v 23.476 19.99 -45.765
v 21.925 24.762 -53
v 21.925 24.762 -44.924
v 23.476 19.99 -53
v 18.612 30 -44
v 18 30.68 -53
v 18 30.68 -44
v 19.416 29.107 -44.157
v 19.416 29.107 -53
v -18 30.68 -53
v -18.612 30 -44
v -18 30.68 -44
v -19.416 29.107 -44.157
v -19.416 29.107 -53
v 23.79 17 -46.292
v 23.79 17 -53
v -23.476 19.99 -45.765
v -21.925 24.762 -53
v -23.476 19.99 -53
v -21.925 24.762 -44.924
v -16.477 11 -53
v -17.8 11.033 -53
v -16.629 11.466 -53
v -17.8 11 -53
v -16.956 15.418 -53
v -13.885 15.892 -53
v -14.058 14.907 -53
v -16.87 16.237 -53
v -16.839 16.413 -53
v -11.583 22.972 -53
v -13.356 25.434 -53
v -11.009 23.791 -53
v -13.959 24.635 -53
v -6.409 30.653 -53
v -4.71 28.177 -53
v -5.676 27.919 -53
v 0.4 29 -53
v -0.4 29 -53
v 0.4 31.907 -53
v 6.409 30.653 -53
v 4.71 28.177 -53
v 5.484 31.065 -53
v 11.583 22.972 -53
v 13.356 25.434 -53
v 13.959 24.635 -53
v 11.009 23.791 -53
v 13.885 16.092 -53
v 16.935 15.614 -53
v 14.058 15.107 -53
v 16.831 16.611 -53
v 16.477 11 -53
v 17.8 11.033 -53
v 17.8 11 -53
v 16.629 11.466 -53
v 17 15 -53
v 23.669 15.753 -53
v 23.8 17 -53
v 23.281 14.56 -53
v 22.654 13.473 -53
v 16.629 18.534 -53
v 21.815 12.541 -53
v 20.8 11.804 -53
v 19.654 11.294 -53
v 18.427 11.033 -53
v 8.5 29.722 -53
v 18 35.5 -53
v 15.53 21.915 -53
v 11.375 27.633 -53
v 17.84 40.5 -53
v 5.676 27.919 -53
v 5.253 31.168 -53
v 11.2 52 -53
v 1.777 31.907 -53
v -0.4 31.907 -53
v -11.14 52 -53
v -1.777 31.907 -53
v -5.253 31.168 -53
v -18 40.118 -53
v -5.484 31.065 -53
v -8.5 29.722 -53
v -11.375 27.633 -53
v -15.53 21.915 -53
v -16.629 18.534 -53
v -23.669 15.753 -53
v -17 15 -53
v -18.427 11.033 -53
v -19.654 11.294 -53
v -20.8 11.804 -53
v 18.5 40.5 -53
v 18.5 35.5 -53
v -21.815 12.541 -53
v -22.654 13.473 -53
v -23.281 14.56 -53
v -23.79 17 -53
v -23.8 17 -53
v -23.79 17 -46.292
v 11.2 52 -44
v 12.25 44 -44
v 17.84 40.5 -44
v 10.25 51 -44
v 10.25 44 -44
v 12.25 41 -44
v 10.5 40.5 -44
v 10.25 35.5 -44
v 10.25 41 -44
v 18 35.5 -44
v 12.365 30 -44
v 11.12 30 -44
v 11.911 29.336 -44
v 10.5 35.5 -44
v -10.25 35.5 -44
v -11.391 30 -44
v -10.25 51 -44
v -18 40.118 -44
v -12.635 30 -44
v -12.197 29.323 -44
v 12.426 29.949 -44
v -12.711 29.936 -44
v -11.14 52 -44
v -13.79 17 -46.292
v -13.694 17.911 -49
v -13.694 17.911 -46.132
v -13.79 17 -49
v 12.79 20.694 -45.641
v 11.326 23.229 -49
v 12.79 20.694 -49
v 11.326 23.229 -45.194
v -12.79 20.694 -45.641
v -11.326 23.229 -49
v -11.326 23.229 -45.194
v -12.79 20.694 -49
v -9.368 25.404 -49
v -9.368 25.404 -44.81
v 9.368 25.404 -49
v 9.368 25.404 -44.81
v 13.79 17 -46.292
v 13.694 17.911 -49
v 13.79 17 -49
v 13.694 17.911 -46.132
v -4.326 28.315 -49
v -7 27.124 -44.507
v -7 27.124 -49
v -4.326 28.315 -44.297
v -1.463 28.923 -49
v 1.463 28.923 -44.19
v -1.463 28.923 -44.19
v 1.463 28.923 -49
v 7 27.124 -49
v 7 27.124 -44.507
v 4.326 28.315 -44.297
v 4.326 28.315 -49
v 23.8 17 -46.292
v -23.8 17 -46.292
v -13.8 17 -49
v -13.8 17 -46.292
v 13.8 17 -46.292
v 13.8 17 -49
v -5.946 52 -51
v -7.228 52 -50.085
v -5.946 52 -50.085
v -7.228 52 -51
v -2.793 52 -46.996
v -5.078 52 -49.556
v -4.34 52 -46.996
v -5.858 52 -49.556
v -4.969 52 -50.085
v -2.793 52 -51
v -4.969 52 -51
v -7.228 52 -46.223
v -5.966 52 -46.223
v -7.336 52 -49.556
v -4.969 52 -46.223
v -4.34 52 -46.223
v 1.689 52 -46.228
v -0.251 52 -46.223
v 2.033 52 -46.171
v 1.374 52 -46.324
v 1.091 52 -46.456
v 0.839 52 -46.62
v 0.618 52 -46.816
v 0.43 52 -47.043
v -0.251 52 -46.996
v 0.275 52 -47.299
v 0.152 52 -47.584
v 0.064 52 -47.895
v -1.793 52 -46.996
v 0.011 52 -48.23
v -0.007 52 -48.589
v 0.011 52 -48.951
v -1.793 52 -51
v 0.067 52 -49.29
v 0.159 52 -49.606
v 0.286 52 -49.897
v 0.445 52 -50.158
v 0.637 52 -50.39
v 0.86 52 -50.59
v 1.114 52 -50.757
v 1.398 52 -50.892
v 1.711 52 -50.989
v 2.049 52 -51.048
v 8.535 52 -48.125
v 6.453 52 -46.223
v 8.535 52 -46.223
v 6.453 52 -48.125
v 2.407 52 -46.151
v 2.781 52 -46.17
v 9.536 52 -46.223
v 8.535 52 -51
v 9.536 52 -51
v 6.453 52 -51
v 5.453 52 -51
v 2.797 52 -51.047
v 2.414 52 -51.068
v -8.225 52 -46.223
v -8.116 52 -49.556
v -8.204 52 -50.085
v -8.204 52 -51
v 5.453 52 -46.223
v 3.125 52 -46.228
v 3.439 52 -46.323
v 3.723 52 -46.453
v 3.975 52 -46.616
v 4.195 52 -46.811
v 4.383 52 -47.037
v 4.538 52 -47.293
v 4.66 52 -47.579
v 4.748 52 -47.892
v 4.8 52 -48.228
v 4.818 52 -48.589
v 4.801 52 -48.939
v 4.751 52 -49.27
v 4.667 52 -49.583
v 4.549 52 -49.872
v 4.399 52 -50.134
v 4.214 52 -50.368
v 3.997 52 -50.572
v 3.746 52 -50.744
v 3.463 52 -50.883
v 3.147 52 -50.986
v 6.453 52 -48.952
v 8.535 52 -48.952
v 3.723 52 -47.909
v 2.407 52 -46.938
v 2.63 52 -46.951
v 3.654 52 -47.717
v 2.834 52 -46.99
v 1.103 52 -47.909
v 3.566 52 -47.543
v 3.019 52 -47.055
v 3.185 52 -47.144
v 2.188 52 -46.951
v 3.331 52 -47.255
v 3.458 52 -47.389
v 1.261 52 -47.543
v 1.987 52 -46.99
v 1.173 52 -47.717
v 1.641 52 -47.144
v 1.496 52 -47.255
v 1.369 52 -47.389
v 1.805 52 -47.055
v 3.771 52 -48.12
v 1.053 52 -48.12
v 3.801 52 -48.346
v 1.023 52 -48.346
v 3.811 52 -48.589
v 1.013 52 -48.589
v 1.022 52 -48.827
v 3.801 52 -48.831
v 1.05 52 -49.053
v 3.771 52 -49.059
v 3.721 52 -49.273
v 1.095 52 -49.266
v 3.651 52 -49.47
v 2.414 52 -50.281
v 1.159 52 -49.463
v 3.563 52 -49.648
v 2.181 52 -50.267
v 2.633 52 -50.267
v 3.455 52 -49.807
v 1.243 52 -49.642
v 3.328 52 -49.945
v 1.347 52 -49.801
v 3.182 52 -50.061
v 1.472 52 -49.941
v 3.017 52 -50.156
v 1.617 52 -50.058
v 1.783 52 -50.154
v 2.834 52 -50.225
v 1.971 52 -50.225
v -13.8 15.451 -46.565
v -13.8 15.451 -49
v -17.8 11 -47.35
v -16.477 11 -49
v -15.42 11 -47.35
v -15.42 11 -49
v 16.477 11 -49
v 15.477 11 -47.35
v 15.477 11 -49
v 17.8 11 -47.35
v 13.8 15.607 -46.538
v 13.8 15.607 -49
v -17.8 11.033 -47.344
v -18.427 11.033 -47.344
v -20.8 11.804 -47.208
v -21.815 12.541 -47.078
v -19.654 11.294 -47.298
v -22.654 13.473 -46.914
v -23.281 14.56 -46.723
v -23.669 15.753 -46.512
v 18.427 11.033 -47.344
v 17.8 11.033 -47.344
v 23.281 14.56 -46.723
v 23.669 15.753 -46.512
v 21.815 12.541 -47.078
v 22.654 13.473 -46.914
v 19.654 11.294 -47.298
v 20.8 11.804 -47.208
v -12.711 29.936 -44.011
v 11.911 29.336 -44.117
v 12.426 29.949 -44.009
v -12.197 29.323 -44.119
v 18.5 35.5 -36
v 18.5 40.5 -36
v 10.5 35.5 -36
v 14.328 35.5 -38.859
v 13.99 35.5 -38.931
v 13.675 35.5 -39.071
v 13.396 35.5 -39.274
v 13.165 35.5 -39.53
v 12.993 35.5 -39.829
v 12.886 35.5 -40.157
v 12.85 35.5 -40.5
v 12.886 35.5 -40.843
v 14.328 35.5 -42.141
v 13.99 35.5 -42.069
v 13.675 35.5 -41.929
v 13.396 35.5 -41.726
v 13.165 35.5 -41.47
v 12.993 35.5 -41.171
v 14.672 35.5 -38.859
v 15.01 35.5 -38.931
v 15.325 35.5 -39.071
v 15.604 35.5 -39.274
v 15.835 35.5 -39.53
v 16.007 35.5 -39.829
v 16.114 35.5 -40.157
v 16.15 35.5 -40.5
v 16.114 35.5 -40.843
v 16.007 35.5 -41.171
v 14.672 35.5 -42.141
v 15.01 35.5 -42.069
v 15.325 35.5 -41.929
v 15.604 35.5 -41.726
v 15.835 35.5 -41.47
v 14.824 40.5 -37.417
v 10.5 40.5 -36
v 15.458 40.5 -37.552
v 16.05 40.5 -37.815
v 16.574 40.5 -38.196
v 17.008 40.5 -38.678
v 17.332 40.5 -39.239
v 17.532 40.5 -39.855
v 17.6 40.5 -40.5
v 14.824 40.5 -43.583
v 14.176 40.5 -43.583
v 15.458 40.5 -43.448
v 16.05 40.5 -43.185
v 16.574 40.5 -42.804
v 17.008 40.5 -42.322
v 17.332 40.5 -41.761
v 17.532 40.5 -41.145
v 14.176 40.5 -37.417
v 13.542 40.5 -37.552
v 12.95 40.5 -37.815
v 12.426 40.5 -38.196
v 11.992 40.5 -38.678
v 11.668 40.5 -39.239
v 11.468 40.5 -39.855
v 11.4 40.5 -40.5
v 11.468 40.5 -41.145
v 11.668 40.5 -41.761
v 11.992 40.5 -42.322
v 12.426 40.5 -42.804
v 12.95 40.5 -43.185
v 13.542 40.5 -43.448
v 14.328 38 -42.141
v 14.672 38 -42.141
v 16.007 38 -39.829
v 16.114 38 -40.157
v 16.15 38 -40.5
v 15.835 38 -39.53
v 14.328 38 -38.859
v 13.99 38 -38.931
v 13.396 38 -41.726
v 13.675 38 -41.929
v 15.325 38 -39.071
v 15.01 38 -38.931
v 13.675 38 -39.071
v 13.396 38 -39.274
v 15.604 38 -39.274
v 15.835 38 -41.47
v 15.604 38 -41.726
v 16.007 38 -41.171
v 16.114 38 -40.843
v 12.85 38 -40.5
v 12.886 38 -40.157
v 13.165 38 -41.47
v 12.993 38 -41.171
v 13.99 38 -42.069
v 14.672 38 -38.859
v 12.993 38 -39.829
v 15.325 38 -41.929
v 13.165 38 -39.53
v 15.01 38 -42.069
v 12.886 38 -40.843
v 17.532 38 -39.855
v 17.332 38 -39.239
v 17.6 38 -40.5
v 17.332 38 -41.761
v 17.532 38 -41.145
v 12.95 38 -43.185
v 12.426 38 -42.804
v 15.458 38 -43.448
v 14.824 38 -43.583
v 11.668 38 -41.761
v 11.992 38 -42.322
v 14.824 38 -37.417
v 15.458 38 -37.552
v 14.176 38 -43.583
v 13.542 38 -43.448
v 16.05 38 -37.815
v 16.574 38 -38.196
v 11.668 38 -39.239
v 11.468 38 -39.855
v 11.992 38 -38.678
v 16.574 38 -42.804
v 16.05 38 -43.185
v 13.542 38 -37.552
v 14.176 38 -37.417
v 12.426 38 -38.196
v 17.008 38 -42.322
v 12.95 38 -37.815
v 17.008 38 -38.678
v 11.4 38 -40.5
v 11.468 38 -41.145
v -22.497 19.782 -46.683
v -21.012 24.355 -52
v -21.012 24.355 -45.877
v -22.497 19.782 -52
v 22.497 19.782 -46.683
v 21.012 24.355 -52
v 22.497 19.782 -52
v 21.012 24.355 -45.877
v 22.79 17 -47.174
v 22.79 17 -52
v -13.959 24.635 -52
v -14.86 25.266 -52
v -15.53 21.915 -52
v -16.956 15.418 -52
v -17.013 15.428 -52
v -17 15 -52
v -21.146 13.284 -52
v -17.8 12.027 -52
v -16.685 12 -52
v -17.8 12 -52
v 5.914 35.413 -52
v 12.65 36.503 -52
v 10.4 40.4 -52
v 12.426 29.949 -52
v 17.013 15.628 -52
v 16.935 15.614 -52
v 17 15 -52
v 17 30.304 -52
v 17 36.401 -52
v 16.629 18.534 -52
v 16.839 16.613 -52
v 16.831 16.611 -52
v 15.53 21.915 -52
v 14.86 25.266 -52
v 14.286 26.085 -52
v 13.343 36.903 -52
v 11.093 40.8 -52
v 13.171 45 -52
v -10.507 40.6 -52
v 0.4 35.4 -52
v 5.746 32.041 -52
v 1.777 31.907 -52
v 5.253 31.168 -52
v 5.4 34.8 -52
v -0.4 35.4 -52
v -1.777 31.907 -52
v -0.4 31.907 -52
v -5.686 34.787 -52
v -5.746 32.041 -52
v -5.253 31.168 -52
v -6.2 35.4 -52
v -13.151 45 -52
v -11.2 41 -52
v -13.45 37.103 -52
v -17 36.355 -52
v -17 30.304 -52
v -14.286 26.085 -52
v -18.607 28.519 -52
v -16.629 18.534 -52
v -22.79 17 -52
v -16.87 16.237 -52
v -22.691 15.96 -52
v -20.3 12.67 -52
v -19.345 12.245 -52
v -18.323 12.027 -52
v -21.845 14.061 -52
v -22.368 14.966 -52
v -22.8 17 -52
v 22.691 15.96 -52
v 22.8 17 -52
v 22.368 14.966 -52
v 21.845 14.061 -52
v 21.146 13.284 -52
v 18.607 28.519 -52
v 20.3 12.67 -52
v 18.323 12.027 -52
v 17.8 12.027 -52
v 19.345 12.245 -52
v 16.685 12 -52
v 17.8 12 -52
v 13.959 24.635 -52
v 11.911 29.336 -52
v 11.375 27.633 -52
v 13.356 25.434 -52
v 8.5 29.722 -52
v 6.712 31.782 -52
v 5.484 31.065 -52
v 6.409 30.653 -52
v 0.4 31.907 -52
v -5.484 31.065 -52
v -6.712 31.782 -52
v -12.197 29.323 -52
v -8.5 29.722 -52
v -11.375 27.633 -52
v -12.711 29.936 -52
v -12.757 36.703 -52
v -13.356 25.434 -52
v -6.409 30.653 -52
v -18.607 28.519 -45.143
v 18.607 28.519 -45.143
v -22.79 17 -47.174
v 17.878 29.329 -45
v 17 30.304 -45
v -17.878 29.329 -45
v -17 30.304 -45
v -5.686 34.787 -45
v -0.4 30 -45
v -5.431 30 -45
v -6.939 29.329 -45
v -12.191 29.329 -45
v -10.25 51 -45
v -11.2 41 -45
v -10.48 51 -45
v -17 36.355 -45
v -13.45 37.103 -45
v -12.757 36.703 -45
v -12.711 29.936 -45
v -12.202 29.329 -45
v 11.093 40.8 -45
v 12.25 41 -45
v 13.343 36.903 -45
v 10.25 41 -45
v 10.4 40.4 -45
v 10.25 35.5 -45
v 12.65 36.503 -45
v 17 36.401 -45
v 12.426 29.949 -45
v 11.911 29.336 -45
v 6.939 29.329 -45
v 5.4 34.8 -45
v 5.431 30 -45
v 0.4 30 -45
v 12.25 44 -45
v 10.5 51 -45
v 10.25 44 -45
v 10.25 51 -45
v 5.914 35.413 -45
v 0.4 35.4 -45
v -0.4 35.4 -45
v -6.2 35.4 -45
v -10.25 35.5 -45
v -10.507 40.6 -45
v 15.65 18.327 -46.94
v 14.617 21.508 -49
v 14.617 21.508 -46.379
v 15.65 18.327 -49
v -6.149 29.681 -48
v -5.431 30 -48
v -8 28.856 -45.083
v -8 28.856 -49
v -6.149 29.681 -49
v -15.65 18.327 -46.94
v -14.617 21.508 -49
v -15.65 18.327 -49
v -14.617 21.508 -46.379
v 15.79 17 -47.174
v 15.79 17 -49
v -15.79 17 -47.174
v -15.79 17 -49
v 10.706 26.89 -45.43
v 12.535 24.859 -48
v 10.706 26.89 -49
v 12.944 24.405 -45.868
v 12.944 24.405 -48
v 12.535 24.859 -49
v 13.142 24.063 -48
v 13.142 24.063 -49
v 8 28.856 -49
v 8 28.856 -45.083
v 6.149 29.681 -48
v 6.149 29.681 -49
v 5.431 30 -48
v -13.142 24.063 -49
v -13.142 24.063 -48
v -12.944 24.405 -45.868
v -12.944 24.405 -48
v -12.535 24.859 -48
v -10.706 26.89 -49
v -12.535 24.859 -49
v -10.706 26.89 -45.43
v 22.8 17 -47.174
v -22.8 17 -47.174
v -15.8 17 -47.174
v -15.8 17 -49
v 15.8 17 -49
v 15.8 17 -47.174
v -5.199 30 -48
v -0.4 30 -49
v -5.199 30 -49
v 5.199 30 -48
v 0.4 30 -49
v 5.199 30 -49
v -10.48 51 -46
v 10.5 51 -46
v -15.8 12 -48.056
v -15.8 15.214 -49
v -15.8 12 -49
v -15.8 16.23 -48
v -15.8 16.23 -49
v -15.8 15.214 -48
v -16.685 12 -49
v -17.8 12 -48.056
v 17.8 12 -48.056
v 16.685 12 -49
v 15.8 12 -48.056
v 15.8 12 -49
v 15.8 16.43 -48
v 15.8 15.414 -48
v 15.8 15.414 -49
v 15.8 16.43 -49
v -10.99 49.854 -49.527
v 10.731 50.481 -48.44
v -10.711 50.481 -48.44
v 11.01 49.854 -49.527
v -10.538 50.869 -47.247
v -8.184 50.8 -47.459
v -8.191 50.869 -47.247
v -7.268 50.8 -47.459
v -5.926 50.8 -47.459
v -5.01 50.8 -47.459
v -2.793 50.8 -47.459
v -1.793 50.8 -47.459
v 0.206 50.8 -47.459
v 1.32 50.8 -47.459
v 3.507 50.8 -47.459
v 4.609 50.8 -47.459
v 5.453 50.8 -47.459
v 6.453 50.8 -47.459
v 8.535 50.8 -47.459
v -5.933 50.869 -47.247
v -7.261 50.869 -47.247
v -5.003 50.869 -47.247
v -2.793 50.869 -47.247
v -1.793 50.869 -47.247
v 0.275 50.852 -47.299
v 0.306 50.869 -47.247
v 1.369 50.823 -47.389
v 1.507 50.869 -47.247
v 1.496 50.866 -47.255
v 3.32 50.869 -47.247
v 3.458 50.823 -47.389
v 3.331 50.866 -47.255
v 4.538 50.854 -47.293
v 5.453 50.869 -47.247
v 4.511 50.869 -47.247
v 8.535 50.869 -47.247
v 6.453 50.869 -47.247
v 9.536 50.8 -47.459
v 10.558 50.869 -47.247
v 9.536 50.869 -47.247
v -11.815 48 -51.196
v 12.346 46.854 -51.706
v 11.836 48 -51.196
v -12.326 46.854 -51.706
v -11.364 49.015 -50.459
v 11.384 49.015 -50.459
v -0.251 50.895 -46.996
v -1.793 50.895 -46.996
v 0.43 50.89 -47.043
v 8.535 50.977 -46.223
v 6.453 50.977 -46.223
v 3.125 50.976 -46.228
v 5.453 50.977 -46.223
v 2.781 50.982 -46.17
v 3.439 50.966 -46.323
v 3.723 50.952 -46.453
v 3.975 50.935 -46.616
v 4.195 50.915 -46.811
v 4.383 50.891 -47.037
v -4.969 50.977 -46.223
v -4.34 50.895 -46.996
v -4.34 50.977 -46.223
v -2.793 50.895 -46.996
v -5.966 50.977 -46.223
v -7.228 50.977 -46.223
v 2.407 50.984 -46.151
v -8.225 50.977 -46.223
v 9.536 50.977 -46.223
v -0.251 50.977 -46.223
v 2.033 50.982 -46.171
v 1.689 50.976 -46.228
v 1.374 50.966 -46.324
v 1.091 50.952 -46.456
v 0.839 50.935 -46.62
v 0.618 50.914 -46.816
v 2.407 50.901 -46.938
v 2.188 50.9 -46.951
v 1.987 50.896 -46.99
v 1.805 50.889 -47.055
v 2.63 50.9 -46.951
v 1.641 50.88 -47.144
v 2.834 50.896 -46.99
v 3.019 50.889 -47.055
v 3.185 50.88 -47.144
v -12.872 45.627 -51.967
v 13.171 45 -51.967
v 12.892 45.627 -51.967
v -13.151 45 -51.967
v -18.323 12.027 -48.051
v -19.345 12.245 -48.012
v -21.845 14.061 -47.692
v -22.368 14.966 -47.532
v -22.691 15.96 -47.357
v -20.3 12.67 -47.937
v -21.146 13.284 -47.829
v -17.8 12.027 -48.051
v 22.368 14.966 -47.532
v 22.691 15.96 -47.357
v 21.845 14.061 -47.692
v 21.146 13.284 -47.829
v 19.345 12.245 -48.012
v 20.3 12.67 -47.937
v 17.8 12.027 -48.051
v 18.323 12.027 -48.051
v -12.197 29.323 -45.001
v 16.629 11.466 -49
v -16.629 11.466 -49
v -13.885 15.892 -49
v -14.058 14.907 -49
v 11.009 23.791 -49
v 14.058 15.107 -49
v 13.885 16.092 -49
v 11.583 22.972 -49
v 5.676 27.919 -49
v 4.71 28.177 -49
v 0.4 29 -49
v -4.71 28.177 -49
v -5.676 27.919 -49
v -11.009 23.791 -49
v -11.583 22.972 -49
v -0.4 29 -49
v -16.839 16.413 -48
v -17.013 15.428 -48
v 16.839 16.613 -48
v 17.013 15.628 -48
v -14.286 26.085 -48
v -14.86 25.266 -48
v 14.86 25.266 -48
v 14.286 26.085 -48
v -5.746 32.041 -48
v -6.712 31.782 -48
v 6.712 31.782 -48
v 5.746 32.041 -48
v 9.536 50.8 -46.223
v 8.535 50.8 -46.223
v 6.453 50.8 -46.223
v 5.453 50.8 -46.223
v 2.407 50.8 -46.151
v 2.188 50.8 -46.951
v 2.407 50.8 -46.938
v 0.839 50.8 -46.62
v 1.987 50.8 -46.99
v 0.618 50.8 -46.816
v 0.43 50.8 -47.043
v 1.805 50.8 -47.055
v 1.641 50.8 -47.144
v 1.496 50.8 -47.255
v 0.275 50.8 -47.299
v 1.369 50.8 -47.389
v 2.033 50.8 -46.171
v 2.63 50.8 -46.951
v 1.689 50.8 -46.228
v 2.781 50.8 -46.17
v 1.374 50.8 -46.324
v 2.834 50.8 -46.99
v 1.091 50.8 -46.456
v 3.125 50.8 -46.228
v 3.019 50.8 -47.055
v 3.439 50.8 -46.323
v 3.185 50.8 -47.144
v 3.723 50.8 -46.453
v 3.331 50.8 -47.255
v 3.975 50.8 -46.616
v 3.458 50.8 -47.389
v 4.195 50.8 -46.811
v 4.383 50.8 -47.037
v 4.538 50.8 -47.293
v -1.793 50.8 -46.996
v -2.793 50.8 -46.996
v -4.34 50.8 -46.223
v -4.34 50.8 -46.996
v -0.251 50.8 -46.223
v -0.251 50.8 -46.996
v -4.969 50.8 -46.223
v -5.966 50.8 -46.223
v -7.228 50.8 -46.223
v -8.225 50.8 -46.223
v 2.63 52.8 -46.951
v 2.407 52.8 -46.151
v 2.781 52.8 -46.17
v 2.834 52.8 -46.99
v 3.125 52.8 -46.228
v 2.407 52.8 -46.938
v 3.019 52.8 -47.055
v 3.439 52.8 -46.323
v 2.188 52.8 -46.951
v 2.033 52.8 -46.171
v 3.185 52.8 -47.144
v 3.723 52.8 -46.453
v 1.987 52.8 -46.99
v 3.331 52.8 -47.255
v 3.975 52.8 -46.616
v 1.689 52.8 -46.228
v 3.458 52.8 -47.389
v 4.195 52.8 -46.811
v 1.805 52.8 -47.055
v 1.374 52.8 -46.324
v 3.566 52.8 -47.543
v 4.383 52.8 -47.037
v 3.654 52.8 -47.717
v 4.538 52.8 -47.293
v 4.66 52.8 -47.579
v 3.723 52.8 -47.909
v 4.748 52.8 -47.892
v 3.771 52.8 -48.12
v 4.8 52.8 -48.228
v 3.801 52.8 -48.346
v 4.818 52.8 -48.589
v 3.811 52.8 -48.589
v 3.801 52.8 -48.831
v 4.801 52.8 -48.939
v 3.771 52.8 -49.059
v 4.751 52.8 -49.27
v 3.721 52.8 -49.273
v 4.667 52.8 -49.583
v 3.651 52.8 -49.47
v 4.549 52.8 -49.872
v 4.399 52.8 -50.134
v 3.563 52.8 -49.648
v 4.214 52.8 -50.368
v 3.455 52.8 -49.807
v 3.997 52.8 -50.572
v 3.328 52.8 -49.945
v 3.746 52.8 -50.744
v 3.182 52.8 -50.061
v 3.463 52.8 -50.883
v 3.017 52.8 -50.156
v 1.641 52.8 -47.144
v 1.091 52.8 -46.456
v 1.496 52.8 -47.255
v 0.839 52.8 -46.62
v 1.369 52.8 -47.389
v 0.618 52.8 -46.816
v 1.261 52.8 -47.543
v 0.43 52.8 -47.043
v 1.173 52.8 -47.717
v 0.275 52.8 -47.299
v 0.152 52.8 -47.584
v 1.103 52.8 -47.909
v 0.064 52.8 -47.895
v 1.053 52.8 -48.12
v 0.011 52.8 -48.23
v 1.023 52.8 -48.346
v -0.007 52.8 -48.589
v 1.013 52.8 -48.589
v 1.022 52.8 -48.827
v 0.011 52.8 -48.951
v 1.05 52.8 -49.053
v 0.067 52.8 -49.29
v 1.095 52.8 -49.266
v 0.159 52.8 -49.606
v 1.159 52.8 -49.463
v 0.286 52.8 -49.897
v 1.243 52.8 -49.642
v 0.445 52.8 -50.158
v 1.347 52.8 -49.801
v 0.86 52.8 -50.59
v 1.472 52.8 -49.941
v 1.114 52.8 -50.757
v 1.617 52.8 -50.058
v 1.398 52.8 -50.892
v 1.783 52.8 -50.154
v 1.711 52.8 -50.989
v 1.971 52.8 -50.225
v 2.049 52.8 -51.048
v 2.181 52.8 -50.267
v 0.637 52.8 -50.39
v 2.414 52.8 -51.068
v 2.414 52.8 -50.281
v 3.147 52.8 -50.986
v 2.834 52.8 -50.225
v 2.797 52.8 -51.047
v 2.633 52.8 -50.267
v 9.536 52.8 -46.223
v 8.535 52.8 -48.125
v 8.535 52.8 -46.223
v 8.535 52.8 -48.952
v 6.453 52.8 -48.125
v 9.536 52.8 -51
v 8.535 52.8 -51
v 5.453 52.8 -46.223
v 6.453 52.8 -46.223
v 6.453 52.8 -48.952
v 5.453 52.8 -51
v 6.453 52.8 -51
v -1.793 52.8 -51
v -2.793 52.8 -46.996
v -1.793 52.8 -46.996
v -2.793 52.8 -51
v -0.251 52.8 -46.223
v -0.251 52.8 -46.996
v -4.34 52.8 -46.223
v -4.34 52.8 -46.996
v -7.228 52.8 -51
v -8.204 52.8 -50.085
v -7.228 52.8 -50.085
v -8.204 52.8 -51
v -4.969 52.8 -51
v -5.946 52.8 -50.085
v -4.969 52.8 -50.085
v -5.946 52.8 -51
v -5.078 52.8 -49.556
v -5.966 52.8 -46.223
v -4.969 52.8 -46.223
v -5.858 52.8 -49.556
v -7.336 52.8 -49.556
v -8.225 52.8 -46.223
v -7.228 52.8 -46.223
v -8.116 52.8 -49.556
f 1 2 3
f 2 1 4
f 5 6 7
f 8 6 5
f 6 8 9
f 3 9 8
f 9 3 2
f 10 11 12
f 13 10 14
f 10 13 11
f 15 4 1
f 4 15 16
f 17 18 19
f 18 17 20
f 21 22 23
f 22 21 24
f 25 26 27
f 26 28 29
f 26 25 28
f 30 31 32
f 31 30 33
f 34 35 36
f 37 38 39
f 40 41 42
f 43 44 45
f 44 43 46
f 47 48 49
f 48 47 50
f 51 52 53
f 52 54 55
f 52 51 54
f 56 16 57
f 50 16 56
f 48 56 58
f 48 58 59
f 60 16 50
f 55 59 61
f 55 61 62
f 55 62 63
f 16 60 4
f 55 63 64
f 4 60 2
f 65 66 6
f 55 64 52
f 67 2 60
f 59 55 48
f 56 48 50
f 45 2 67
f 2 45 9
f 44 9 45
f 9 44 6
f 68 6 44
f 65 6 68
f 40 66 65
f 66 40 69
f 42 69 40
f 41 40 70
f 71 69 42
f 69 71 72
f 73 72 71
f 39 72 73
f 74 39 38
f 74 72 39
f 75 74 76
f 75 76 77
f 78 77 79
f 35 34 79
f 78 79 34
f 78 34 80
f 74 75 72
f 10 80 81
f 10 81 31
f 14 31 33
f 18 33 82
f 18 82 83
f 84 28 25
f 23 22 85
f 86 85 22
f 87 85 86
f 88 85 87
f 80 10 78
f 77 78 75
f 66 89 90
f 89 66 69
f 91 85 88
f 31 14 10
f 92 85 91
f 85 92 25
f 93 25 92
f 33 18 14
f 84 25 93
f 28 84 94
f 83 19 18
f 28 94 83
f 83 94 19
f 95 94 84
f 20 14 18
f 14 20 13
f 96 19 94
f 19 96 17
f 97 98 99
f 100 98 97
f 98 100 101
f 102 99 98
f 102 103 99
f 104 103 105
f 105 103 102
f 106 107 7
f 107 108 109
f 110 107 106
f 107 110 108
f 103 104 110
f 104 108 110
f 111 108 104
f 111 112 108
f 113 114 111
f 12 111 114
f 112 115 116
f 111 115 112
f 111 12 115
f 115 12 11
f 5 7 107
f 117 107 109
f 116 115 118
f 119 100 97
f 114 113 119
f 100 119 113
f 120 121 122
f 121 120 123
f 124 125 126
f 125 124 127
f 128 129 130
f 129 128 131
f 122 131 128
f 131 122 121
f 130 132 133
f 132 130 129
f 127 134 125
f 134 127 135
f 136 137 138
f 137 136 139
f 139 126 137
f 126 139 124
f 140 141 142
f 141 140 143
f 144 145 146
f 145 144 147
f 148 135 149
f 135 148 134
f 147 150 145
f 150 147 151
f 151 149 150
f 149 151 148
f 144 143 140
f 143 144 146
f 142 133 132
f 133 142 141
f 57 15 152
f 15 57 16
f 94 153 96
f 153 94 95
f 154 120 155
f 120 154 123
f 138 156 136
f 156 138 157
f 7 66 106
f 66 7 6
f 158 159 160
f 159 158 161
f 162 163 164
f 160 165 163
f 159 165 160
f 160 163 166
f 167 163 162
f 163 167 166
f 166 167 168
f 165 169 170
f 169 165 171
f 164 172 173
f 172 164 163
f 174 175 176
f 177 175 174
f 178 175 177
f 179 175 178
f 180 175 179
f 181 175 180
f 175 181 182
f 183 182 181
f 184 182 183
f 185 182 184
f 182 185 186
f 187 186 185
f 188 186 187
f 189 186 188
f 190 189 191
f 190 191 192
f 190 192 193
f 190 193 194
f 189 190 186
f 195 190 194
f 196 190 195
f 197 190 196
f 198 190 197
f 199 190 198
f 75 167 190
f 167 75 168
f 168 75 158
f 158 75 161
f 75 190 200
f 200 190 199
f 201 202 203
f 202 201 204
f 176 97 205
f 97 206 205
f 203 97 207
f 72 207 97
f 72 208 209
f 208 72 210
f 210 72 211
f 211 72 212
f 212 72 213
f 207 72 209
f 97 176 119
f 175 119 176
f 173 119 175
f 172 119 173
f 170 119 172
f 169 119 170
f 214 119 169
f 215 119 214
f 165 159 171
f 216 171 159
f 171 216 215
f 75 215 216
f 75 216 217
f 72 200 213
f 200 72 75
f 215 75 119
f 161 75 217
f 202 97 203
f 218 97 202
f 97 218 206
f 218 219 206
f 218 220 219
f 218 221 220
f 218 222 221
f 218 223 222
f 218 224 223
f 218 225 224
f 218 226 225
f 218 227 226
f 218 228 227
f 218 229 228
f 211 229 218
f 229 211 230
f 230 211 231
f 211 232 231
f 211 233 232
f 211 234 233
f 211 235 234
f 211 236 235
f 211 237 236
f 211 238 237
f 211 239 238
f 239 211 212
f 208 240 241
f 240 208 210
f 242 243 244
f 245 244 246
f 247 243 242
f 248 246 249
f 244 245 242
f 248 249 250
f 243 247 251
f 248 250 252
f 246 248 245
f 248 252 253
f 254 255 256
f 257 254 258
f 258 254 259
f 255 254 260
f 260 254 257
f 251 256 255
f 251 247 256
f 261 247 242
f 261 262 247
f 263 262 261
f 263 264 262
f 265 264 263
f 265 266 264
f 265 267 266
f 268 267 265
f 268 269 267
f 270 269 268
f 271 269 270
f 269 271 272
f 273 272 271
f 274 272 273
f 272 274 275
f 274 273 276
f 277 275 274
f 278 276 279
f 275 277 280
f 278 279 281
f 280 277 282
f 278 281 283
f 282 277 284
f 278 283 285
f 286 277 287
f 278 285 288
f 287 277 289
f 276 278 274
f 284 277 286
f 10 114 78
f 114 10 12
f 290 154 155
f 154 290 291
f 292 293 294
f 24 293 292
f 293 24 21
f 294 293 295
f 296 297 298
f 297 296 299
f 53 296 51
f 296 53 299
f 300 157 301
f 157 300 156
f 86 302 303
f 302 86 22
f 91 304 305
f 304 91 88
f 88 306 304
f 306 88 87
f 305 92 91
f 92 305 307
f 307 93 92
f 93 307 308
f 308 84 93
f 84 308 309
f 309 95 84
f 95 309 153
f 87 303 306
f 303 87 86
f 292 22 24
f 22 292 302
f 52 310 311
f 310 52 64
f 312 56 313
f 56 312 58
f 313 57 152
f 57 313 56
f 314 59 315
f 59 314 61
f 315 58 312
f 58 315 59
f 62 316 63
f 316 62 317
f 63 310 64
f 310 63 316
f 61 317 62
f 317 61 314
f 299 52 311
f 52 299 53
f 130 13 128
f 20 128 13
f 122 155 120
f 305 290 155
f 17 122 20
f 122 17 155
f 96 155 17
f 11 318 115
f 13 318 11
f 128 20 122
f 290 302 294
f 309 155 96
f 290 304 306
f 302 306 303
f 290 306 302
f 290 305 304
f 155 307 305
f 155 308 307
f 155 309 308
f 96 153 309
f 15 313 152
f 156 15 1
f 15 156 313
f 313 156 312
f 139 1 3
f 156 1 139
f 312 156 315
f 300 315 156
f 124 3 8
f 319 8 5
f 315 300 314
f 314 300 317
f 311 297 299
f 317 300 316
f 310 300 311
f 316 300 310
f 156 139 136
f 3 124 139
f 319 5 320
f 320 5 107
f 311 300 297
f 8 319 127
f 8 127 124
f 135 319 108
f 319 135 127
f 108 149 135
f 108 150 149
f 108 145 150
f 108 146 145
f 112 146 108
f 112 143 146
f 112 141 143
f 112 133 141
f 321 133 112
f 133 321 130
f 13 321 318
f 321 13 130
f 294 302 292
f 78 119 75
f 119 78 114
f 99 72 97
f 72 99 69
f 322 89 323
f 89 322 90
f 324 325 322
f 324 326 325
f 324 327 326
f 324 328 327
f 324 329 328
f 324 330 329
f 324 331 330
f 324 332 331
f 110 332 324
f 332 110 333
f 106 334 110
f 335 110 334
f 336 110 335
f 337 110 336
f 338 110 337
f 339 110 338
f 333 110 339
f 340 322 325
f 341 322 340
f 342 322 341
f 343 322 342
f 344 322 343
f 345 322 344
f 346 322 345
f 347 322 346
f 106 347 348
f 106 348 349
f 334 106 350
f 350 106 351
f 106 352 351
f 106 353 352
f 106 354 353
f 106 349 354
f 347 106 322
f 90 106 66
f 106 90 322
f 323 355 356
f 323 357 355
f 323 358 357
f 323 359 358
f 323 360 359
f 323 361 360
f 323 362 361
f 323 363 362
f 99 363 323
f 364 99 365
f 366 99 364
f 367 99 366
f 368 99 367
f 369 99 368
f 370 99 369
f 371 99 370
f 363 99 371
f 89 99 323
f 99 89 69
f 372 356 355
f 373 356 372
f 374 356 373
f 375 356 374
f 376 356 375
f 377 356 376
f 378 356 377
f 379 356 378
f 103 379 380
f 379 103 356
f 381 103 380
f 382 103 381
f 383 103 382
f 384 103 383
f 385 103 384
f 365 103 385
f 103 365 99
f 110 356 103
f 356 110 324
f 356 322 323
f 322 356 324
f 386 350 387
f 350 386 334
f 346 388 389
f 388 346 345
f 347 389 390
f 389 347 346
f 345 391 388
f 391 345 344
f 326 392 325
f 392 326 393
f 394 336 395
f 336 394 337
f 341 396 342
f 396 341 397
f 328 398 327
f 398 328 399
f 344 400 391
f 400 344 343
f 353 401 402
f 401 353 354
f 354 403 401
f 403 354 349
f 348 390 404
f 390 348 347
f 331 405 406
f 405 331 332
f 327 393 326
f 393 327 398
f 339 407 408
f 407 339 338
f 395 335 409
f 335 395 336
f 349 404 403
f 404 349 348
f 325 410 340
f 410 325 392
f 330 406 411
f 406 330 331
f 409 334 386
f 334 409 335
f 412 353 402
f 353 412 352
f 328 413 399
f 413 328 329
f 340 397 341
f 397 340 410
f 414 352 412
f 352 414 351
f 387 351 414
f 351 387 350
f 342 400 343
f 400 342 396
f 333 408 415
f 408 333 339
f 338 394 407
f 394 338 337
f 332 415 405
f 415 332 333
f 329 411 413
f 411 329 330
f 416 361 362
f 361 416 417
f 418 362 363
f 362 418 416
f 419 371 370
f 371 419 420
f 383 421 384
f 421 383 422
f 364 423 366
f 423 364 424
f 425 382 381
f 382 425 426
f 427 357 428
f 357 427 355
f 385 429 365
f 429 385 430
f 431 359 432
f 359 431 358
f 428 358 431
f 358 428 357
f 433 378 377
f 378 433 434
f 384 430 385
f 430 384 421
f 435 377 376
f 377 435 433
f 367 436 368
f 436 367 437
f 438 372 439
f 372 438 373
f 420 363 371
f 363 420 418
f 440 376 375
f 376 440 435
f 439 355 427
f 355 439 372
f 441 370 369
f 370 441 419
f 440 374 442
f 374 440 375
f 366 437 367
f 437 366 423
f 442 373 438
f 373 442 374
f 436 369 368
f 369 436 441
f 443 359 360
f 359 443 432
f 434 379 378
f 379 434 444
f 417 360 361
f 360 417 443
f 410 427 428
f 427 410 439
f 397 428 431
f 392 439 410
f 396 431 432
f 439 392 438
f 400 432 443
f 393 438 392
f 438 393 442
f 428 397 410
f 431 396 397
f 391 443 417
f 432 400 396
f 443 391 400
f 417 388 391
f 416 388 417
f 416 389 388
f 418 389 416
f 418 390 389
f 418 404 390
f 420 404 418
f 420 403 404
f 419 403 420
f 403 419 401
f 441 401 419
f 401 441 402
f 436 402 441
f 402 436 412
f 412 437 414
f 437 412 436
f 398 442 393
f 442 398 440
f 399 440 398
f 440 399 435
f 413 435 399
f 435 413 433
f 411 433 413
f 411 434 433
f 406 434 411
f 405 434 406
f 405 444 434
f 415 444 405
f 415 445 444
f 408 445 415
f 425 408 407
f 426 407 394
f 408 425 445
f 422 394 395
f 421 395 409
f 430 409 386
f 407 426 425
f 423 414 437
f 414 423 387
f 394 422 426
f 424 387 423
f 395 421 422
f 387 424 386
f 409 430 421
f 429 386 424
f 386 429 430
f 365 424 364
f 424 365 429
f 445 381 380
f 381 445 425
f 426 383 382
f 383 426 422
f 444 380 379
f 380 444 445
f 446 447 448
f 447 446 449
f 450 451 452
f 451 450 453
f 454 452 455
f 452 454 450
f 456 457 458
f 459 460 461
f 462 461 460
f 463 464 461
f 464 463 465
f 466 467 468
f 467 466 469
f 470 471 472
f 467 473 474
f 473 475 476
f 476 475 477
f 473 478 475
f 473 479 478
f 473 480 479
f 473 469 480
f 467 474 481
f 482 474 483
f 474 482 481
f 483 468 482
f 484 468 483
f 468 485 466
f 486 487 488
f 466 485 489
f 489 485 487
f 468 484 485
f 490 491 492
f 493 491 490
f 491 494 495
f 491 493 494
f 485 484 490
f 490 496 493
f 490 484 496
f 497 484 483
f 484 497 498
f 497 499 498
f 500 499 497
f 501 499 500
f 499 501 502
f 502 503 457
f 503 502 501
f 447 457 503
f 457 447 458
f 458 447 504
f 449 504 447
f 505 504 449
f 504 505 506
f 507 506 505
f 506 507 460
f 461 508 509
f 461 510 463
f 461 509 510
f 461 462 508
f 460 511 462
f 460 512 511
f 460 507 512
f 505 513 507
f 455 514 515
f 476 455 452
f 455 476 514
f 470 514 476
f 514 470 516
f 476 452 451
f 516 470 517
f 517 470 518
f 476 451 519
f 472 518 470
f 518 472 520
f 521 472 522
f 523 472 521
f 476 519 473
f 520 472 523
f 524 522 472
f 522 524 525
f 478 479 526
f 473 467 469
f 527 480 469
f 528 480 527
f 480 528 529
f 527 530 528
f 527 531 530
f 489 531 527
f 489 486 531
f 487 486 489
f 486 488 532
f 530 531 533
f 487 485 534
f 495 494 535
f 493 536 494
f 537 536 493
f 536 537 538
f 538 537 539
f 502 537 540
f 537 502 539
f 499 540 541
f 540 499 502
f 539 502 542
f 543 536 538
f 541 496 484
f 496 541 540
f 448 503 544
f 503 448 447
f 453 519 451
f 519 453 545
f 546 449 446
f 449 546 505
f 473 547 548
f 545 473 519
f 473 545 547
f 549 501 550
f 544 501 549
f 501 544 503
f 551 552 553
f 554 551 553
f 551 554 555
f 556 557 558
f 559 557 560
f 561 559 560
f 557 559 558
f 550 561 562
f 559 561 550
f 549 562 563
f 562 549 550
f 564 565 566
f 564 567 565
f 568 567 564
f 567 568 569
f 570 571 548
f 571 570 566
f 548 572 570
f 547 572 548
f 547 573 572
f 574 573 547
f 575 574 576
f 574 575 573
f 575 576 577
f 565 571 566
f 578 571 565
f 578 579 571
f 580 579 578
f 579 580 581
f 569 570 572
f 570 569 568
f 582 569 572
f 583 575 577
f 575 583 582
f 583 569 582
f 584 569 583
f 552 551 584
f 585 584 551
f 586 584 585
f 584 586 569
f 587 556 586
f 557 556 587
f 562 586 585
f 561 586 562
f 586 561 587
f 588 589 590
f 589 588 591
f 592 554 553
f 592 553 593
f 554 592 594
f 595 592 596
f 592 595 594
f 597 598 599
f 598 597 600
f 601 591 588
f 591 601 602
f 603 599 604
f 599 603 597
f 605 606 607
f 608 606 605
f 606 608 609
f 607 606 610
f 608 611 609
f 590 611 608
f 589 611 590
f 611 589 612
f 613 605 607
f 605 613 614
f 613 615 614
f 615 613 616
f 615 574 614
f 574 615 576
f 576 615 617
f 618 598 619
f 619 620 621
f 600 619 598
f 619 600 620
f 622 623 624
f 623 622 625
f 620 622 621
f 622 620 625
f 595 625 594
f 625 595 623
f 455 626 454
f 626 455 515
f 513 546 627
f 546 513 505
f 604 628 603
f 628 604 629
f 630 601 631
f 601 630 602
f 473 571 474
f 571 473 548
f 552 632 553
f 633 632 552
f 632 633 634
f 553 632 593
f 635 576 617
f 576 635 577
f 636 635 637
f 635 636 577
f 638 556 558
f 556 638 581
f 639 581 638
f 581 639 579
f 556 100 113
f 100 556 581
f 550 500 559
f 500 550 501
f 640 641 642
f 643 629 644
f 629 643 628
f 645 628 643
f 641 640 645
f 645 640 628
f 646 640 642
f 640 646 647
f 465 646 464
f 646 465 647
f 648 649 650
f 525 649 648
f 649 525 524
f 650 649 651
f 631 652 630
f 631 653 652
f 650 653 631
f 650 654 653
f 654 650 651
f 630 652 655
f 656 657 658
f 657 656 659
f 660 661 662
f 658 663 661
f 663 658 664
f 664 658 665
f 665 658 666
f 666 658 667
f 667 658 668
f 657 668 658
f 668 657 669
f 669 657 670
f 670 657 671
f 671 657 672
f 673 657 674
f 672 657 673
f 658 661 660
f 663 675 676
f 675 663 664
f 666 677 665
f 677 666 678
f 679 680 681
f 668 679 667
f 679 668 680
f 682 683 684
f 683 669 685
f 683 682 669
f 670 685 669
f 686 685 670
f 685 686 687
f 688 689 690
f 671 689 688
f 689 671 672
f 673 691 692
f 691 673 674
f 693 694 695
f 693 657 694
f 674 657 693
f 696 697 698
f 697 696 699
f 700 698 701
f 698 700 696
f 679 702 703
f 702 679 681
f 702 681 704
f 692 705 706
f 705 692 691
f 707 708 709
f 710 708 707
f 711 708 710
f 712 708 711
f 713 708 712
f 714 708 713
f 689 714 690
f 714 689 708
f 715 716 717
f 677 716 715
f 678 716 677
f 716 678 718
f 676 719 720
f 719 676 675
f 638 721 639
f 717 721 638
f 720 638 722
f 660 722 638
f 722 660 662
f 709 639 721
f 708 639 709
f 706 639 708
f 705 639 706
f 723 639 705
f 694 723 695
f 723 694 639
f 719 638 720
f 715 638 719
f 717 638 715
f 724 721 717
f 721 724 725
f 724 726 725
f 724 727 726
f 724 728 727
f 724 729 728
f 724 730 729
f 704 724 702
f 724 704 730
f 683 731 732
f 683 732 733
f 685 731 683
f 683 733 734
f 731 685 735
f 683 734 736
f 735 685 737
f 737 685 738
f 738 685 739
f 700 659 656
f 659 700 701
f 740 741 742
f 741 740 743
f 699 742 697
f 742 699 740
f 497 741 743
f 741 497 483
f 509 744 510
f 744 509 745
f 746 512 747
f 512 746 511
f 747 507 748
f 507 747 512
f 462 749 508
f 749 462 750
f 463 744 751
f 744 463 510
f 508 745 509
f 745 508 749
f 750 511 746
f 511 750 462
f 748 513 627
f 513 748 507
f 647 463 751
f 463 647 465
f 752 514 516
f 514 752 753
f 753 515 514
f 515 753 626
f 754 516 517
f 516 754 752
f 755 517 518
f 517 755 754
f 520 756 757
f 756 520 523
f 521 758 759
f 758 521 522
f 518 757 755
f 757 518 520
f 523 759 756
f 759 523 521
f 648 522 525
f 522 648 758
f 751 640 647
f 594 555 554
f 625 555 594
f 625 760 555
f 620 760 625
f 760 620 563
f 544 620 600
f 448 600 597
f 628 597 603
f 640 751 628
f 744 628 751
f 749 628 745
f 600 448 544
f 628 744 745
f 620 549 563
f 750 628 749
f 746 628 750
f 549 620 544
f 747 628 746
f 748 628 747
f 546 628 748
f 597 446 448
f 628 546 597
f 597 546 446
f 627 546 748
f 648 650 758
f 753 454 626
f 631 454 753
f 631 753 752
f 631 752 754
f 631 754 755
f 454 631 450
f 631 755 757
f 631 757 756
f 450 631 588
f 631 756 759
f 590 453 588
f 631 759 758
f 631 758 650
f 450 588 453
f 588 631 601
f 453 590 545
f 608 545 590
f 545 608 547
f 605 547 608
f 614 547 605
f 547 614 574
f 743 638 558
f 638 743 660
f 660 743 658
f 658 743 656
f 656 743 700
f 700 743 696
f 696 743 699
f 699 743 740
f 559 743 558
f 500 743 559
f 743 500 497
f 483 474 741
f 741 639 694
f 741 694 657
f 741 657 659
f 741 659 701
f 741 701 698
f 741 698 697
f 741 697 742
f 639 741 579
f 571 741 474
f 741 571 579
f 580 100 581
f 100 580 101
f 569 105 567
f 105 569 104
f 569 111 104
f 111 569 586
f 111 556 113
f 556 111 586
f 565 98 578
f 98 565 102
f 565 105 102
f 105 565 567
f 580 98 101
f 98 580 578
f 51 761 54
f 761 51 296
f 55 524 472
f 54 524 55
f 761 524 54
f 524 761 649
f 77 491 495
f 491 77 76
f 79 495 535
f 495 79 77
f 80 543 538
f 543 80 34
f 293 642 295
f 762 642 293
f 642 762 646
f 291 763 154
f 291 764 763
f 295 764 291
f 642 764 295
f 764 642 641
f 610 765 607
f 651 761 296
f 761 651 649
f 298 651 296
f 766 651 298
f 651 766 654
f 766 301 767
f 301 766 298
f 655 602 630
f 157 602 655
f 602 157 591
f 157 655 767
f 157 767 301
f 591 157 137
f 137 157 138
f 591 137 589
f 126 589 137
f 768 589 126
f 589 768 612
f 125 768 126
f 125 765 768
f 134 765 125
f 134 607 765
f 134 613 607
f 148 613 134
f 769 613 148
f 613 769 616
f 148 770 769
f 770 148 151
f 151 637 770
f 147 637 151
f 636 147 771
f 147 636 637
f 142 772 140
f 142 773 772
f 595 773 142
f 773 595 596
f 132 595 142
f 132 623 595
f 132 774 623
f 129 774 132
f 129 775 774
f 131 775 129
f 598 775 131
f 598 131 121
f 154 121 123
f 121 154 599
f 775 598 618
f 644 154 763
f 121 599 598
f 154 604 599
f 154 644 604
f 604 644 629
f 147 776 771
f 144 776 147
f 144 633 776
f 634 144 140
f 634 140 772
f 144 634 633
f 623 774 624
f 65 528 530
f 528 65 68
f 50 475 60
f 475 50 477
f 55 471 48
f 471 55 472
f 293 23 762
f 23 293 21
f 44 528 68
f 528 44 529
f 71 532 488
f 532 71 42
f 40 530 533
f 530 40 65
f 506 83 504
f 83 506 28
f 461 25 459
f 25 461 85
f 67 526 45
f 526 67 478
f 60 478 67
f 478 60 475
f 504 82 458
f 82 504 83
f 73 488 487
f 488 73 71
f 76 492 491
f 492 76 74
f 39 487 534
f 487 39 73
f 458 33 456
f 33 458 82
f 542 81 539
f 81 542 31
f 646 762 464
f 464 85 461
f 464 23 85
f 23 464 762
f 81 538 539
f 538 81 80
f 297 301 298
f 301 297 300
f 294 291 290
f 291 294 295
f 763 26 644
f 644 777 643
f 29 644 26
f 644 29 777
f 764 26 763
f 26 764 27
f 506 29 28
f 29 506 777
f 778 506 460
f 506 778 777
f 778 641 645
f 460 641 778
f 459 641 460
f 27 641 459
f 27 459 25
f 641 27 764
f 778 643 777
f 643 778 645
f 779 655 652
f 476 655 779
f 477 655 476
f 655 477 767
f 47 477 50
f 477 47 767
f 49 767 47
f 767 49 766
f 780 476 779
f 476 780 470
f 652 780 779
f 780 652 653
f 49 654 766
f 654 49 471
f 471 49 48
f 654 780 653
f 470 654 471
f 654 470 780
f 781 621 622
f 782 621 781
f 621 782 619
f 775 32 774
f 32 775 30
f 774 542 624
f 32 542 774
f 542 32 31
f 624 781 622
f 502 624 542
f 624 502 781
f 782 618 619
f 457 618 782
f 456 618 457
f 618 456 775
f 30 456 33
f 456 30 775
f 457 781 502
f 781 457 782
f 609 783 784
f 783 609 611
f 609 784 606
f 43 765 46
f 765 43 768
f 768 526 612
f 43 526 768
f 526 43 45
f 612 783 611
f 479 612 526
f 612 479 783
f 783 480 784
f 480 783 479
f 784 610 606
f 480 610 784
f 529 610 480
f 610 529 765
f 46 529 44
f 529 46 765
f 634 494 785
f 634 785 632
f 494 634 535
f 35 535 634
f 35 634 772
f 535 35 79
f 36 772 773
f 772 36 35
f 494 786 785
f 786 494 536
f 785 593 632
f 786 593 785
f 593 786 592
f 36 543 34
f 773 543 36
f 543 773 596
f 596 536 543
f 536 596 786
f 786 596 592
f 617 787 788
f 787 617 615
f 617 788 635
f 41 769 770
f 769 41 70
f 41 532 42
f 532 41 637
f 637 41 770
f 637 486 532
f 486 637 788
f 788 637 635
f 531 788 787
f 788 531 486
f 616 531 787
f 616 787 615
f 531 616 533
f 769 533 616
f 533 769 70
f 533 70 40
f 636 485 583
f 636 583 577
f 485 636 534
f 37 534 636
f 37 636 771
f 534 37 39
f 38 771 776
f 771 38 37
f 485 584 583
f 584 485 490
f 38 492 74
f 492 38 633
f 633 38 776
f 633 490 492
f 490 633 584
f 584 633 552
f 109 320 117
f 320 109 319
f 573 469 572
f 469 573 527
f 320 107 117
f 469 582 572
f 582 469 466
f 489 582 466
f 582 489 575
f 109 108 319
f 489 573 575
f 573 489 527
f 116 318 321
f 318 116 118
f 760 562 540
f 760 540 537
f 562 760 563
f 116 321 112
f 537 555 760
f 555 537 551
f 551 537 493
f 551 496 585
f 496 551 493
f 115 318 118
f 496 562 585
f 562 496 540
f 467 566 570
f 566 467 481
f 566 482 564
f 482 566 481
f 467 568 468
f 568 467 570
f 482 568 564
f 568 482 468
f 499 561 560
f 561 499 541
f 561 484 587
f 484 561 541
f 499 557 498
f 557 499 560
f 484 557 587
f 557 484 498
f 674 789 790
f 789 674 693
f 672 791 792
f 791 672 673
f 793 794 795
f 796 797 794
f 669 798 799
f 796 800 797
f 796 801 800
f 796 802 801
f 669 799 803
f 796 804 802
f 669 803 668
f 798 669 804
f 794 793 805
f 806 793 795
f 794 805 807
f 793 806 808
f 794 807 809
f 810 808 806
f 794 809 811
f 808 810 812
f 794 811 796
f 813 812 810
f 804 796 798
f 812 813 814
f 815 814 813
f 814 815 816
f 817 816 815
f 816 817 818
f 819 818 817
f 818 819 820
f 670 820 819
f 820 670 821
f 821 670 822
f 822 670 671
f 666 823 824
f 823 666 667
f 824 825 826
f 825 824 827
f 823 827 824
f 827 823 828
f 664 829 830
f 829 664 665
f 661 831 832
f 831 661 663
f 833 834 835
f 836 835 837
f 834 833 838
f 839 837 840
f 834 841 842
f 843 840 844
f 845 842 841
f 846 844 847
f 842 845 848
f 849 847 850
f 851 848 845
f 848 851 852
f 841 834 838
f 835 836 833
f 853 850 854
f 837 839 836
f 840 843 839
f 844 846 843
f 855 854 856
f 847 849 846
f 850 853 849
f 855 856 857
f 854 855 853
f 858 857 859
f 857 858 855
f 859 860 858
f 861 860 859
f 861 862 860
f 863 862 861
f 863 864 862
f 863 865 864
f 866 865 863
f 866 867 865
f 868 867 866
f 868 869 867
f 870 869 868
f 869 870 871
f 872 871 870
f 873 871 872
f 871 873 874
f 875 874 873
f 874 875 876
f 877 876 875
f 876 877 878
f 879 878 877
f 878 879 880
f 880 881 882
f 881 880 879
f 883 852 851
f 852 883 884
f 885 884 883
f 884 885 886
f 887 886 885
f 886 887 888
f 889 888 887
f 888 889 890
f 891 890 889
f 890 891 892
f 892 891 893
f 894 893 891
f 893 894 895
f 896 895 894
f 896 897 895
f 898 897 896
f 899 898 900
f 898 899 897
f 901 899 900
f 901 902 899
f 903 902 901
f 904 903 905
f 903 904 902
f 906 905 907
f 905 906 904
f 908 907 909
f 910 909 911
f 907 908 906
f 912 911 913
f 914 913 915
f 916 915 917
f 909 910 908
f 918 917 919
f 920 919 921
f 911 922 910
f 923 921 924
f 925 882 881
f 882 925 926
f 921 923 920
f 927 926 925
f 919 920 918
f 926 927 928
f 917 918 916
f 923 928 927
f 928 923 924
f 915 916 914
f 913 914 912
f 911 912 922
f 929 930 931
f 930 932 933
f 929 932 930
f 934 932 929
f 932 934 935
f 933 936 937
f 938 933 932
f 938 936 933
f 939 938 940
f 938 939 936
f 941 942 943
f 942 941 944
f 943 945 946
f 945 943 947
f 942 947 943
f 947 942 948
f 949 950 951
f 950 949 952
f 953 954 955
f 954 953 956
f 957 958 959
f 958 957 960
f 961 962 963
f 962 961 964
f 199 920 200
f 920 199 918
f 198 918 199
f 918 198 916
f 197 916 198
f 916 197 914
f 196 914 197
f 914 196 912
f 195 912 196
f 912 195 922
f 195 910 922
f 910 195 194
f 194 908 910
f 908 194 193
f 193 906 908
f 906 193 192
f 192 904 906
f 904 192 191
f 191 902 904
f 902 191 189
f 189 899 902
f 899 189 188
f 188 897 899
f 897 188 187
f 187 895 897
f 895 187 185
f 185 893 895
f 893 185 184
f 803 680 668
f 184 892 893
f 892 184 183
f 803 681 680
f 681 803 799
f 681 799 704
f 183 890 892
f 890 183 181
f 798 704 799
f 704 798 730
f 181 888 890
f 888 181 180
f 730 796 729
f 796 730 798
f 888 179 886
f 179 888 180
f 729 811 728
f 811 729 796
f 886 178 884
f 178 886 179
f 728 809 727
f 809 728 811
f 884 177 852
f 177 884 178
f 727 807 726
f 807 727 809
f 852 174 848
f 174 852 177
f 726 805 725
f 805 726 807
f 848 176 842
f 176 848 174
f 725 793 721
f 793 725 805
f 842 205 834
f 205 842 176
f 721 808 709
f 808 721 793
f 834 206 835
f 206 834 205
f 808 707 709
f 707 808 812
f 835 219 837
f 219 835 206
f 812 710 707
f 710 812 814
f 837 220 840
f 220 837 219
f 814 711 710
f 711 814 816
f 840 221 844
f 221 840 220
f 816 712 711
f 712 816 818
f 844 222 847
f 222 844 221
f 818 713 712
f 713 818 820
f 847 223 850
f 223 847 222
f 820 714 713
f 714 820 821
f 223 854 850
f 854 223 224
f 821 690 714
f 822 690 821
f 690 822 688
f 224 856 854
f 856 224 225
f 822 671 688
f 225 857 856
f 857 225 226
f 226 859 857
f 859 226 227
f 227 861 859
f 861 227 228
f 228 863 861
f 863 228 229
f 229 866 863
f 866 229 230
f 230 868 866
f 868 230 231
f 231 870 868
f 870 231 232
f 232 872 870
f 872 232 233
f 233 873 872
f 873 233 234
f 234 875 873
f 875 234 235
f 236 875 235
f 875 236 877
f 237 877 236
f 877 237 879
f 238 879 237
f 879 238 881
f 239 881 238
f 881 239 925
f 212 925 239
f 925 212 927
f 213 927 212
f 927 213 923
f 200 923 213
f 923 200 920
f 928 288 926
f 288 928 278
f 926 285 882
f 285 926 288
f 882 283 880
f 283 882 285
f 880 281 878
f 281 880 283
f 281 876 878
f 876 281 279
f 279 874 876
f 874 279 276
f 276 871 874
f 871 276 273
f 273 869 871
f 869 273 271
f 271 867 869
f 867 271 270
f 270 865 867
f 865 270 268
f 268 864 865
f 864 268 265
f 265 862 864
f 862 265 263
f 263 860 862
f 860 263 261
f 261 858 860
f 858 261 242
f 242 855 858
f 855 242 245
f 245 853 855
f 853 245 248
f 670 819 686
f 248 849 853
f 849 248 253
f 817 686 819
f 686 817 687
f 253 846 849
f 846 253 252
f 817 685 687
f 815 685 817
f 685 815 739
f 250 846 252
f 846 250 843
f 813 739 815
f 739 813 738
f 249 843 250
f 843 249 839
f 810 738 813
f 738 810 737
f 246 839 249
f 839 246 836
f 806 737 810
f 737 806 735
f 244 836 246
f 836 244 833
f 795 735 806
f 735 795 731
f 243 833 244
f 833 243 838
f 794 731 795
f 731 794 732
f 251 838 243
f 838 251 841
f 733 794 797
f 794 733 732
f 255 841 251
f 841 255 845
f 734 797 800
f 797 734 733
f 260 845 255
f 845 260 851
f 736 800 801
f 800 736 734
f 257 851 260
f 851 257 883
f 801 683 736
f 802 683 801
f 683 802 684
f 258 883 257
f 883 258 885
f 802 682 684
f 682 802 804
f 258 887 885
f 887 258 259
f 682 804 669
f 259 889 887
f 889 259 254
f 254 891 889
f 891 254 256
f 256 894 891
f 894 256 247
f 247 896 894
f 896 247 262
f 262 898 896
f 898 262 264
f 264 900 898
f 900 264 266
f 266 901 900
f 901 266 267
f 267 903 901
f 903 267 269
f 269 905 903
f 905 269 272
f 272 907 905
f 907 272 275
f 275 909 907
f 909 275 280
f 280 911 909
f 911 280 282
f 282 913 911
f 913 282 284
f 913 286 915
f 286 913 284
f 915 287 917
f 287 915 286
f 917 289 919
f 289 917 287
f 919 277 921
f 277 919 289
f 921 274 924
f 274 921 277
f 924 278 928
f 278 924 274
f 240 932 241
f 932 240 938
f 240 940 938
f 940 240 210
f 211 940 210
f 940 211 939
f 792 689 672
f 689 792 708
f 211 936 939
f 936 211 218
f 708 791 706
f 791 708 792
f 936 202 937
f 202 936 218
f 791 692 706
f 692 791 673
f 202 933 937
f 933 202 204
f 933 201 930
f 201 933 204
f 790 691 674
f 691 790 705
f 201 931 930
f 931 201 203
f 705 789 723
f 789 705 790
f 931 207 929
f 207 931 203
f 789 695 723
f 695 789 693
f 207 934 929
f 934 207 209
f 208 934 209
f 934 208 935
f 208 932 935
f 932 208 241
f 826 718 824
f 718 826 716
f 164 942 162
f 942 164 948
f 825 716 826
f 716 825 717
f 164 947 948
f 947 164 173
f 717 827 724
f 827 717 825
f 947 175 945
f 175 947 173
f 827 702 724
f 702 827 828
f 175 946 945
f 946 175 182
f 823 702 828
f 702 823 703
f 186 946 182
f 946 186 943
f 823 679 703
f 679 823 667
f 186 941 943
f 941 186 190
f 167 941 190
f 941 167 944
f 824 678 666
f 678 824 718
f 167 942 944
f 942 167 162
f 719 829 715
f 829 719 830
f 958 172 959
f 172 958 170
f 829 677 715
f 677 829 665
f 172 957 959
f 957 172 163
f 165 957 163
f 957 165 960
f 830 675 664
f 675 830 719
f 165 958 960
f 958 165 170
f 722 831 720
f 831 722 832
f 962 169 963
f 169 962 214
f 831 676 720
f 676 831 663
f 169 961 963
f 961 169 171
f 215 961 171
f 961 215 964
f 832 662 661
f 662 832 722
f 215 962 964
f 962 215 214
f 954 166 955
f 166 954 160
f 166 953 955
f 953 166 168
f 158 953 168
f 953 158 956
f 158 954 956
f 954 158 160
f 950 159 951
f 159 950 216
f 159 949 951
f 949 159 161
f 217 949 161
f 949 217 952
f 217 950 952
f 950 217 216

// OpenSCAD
// PRUSA iteration4
// Nozzle fan
// GNU GPL v3
// Josef Průša <iam@josefprusa.cz> and contributors
// http://www.reprap.org/wiki/Prusa_Mendel
// http://prusamendel.org

module outer_shape()
{
    difference()
    {    
        union()
        {
            // fan entry block
            translate([-18,-53,-52]) cube([36,9,22]);    
            difference()
            {
                // nozzle base shape
                translate([0,-44,-15]) rotate([90,0,0]) cylinder( h=9, r=24, $fn=30 );
                translate([0,-43,-15]) rotate([90,0,0]) cylinder( h=11, r=14, $fn=30 );
                translate([-25,-54,-17]) cube([50,11,30]);    
            }

            // tips
            translate([-23.8,-53,-17]) cube([10,9,6]);  
            translate([13.8,-53,-17]) cube([10,9,6]);  
        }

        // upper angle cut
        translate([-25,-44,-30]) rotate([10,0,0]) cube([50,10,20]);  
        
        // angled front sides
        translate([-19.8,-54,-57]) rotate([0,-30,0]) cube([10,11,20]);    
        translate([11.2,-54,-52]) rotate([0,30,0]) cube([10,11,20]);    

        // right round edge
        translate([10.2,0,3]) difference()
        {
            translate([-28,-44,-20]) rotate([90,0,0]) cylinder( h=10, r=12, $fn=30 );    
            translate([-28,-43,-20]) rotate([90,0,0]) cylinder( h=12, r=6, $fn=30 );    
            translate([-50,-43,-60]) rotate([90,0,0]) cube([40,40,40]);    
            translate([-28,-43,-40]) rotate([90,0,0]) cube([40,40,40]);    
        }

        // left round edge
        translate([45.8,0,3]) difference()
        {
            translate([-28,-44,-20]) rotate([90,0,0]) cylinder( h=10, r=12, $fn=30 );    
            translate([-28,-43,-20]) rotate([90,0,0]) cylinder( h=12, r=6, $fn=30 );    
            translate([-50,-43,-60]) rotate([90,0,0]) cube([40,40,40]);    
            translate([-68,-43,-40]) rotate([90,0,0]) cube([40,40,40]);    
        }


        
    }

    // mounting block
    difference()
    {
        translate([10.5,-53,-40.5]) cube([8,17,5]);   
        translate([14.5,-40.5,-41]) rotate([0,0,0]) cylinder( h=15, r=1.65, $fn=30 );    
        translate([14.5,-40.5,-42]) rotate([0,0,0]) cylinder( h=4, r=3.1, $fn=30 );    
    }
}



module inner_shape()
{
    difference()
    {    
        union()
        {
            // base block
            translate([-17,-52,-51]) cube([34,7,21]);    
            
            // nozzle inner shape
            difference()
            {
                translate([0,-45,-15]) rotate([90,0,0]) cylinder( h=7, r=23, $fn=30 );
                translate([0,-43,-15]) rotate([90,0,0]) cylinder( h=11, r=16, $fn=30 );
                translate([-25,-54,-17]) cube([50,11,30]);    
            }

            translate([-22.8,-52,-17]) cube([7,7,5]);  
            translate([15.8,-52,-17]) cube([7,7,5]);  
        }
        
        // upper angled cut
        translate([-25,-44,-35]) rotate([10,0,0]) cube([50,10,30]);  
        
        // angled front sides
        translate([-19.2,-54,-56]) rotate([0,-24,0]) cube([10,11,20]);    
        translate([10.5,-54,-51]) rotate([0,24,0]) cube([10,11,20]);    
        
        // smooth entry
        difference()
        {
            translate([-30,-46,-45]) rotate([0,90,0]) cylinder( h=60, r=9, $fn=30 );
            translate([-30,-46,-45]) rotate([0,90,0]) cylinder( h=60, r=6, $fn=30 );
            translate([-30,-46,-52]) cube([60,11,20]);    
            translate([-30,-53,-45]) cube([60,11,20]);    
        }
     
        // left round edge
        translate([10.2,0,3]) difference()
        {
            translate([-28,-44,-20]) rotate([90,0,0]) cylinder( h=10, r=12, $fn=30 );    
            translate([-28,-43,-20]) rotate([90,0,0]) cylinder( h=12, r=5, $fn=30 );    
            translate([-50,-43,-60]) rotate([90,0,0]) cube([40,40,40]);    
            translate([-28,-43,-40]) rotate([90,0,0]) cube([40,40,40]);    
        }

        // right round edge
        translate([45.8,0,3]) difference()
        {
            translate([-28,-44,-20]) rotate([90,0,0]) cylinder( h=10, r=12, $fn=30 );    
            translate([-28,-43,-20]) rotate([90,0,0]) cylinder( h=12, r=5, $fn=30 );    
            translate([-50,-43,-60]) rotate([90,0,0]) cube([40,40,40]);    
            translate([-68,-43,-40]) rotate([90,0,0]) cube([40,40,40]);    
        }
     
     
        
    }

    // fan cut
    translate([-10.25,-46,-51]) cube([20.5,10,15.5]);    
    translate([10.25,-52,-44]) cube([2,15,3]);    

}

 
module base_shape()
{
    difference()
    {
        outer_shape();
        inner_shape();
        // air slot
        translate([0,-49,-15]) rotate([90,0,0]) cylinder( h=7, r=17, $fn=30 );    
    }
}


module fan_nozzle()
{
    difference()
    {
        base_shape();
        
        // nozzle tips cut
        translate([8.7,-53,-15]) rotate([0,20,0]) cube([5,15,15]);    
        translate([-13.6,-53,-16]) rotate([0,-20,0]) cube([5,15,15]);    
    }

    // fins
    translate([8.1,0,-11]) rotate([0,80,0]) translate([0,-53,-25.5]) cube([1,5,3]);    
    translate([-8.1,0,-11.2]) rotate([0,-80,0]) translate([-1,-53,-25.5]) cube([1,5,3]);    
    translate([4.8,0,-11.5]) rotate([0,55,0]) translate([0,-53,-24]) cube([1,5,4]);    
    translate([-4.8,0,-11.5]) rotate([0,-55,0]) translate([-1,-53,-24]) cube([1,5,4]);    
    translate([-0.5,0,-8.6]) rotate([0,15,0]) translate([0,-53,-24]) cube([1,5,4]);    
    translate([0.5,0,-8.6]) rotate([0,-15,0]) translate([-1,-53,-24]) cube([1,5,4]);    


    translate([-0.4,-53,-35.4]) rotate([0,0,0]) cube([0.8,8.8,6.4]); 
    translate([5.4,-53,-34.8]) rotate([0,50,0]) cube([0.8,9,8.5]); 
    translate([-6.2,-53,-35.4]) rotate([0,-50,0]) cube([0.8,9,8.5]); 

    translate([10.4,-53,-40.4]) rotate([0,30,0]) cube([0.8,9,4.5]); 
    translate([-11.2,-53,-41.0]) rotate([0,-30,0]) cube([0.8,9,4.5]); 


    translate([10,-51,-50.8]) rotate([0,180,0]) linear_extrude(height = 2) 
    { text("HOT!!",font = "helvetica:style=Bold", size=5, center=true); }
}

rotate([90,0,0]) fan_nozzle();
